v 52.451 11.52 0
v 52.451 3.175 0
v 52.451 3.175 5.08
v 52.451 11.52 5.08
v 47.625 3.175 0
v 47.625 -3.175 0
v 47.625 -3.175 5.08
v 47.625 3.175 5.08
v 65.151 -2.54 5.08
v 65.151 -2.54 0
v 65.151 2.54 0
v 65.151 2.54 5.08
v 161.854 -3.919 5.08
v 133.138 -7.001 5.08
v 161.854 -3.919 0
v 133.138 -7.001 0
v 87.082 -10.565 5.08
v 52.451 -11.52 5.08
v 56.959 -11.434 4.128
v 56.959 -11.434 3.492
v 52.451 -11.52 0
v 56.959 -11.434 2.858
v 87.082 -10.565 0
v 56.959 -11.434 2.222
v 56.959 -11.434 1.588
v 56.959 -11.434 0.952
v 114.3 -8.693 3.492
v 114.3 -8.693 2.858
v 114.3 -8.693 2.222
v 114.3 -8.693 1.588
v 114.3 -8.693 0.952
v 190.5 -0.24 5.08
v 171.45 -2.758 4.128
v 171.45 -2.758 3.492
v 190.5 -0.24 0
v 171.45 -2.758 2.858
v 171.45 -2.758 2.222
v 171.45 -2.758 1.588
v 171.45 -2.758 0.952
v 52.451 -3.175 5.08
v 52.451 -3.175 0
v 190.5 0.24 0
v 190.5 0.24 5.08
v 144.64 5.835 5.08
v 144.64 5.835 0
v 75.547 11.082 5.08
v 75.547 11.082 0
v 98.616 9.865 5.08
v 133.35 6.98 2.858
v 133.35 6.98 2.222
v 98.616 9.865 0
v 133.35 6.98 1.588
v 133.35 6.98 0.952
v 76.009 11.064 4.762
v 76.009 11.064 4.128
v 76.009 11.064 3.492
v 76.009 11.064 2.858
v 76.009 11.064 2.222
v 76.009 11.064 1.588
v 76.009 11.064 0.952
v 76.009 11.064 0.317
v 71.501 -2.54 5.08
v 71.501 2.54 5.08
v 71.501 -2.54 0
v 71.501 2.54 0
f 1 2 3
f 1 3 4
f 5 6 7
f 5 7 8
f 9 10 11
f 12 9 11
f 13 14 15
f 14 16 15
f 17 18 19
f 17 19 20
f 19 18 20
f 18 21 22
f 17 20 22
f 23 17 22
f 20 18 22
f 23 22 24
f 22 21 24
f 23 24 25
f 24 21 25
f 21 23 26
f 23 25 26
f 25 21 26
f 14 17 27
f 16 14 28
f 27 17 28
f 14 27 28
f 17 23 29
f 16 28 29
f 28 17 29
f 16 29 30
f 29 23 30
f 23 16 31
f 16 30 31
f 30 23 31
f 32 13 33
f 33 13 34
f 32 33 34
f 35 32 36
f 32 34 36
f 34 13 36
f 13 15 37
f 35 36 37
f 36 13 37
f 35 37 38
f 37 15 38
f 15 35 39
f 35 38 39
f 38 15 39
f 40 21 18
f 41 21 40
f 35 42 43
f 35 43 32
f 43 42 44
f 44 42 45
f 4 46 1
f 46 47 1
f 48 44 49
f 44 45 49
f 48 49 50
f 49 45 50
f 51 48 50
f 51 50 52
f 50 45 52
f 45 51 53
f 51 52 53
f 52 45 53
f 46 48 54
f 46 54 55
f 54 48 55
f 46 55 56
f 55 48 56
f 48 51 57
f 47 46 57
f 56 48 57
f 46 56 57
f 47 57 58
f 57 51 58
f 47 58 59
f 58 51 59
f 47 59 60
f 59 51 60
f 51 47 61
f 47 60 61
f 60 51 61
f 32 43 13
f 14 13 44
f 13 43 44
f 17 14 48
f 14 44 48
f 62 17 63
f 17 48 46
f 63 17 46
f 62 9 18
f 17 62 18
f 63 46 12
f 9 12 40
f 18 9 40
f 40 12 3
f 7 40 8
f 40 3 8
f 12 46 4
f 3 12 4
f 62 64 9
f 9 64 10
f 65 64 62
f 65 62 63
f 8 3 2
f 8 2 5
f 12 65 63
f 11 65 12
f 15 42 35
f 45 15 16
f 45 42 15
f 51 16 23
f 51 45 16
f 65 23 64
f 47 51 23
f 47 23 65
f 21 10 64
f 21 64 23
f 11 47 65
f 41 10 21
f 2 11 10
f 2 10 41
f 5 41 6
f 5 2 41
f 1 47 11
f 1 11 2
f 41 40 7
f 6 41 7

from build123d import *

# Parameters (mm, degrees)
BOSS_EXTRUDE1_DEPTH = 5.08
SKETCH3_W           = 4.826
SKETCH3_H           = 8.41502
SKETCH3_W_2         = 6.35
SKETCH3_H_2         = 5.08
CUT_EXTRUDE1_DEPTH  = 6.0800001


with BuildPart() as part:
    # Sketch2 → Boss-Extrude1 (new body)
    with BuildSketch(Plane.XY):
        with BuildLine():
            Line((190.5, 0.24003), (190.5, -0.24003))
            add(Edge.make_bspline(
                [(47.625, -11.59002), (49.21258277, -11.573232478), (52.324251607, -11.529902789), (58.609790093, -11.383526435), (66.486474066, -11.388894153), (76.012099473, -11.081769852), (85.601411445, -10.666111308), (95.189705286, -10.104719356), (104.778286225, -9.448700637), (114.303143312, -8.704754793), (123.828345261, -7.885794466), (133.353195338, -6.990482738), (142.87823509, -6.029908512), (152.403404308, -5.006647903), (161.928923416, -3.922089872), (171.454029858, -2.768063081), (180.980468385, -1.553123331), (187.325723566, -0.677879401), (190.5, -0.24003)],
                knots=[0.63243392, 0.63243392, 0.63243392, 0.63243392, 0.644639622, 0.656358033, 0.680768177, 0.705187031, 0.729619522, 0.754557907, 0.779023814, 0.803506448, 0.828005419, 0.852521438, 0.877054004, 0.901603249, 0.92617022, 0.95075713, 0.975365769, 1, 1, 1, 1], degree=3))
            Line((47.625, -11.59002), (47.625, 11.59002))
            add(Edge.make_bspline(
                [(190.5, 0.24003), (187.325723566, 0.677879401), (180.980468385, 1.553123331), (171.454029858, 2.768063081), (161.928923416, 3.922089872), (152.403404308, 5.006647903), (142.87823509, 6.029908512), (133.353195338, 6.990482738), (123.828345261, 7.885794466), (114.303143312, 8.704754793), (104.778286225, 9.448700637), (95.189705286, 10.104719356), (85.601411445, 10.666111308), (76.012099473, 11.081769852), (66.486474066, 11.388894153), (58.609790093, 11.383526435), (52.324251607, 11.529902789), (49.21258277, 11.573232478), (47.625, 11.59002)],
                knots=[0, 0, 0, 0, 0.024634231, 0.04924287, 0.07382978, 0.098396751, 0.122945996, 0.147478562, 0.171994581, 0.196493552, 0.220976186, 0.245442093, 0.270380478, 0.294812969, 0.319231823, 0.343641967, 0.355360378, 0.36756608, 0.36756608, 0.36756608, 0.36756608], degree=3))
        make_face()
    extrude(amount=BOSS_EXTRUDE1_DEPTH)

    # Sketch3 → Cut-Extrude1 (cut, through all)
    with BuildSketch(Plane(origin=(0, 0, 0), x_dir=(-1, 0, 0), z_dir=(0, 0, -1))):
        with Locations((-50.038, -7.38251)):
            Rectangle(SKETCH3_W, SKETCH3_H)
        with Locations((-50.038, 7.38251)):
            Rectangle(SKETCH3_W, SKETCH3_H)
        with Locations((-68.326, 0)):
            Rectangle(SKETCH3_W_2, SKETCH3_H_2)
    extrude(amount=-CUT_EXTRUDE1_DEPTH, mode=Mode.SUBTRACT)


solid = part.part
